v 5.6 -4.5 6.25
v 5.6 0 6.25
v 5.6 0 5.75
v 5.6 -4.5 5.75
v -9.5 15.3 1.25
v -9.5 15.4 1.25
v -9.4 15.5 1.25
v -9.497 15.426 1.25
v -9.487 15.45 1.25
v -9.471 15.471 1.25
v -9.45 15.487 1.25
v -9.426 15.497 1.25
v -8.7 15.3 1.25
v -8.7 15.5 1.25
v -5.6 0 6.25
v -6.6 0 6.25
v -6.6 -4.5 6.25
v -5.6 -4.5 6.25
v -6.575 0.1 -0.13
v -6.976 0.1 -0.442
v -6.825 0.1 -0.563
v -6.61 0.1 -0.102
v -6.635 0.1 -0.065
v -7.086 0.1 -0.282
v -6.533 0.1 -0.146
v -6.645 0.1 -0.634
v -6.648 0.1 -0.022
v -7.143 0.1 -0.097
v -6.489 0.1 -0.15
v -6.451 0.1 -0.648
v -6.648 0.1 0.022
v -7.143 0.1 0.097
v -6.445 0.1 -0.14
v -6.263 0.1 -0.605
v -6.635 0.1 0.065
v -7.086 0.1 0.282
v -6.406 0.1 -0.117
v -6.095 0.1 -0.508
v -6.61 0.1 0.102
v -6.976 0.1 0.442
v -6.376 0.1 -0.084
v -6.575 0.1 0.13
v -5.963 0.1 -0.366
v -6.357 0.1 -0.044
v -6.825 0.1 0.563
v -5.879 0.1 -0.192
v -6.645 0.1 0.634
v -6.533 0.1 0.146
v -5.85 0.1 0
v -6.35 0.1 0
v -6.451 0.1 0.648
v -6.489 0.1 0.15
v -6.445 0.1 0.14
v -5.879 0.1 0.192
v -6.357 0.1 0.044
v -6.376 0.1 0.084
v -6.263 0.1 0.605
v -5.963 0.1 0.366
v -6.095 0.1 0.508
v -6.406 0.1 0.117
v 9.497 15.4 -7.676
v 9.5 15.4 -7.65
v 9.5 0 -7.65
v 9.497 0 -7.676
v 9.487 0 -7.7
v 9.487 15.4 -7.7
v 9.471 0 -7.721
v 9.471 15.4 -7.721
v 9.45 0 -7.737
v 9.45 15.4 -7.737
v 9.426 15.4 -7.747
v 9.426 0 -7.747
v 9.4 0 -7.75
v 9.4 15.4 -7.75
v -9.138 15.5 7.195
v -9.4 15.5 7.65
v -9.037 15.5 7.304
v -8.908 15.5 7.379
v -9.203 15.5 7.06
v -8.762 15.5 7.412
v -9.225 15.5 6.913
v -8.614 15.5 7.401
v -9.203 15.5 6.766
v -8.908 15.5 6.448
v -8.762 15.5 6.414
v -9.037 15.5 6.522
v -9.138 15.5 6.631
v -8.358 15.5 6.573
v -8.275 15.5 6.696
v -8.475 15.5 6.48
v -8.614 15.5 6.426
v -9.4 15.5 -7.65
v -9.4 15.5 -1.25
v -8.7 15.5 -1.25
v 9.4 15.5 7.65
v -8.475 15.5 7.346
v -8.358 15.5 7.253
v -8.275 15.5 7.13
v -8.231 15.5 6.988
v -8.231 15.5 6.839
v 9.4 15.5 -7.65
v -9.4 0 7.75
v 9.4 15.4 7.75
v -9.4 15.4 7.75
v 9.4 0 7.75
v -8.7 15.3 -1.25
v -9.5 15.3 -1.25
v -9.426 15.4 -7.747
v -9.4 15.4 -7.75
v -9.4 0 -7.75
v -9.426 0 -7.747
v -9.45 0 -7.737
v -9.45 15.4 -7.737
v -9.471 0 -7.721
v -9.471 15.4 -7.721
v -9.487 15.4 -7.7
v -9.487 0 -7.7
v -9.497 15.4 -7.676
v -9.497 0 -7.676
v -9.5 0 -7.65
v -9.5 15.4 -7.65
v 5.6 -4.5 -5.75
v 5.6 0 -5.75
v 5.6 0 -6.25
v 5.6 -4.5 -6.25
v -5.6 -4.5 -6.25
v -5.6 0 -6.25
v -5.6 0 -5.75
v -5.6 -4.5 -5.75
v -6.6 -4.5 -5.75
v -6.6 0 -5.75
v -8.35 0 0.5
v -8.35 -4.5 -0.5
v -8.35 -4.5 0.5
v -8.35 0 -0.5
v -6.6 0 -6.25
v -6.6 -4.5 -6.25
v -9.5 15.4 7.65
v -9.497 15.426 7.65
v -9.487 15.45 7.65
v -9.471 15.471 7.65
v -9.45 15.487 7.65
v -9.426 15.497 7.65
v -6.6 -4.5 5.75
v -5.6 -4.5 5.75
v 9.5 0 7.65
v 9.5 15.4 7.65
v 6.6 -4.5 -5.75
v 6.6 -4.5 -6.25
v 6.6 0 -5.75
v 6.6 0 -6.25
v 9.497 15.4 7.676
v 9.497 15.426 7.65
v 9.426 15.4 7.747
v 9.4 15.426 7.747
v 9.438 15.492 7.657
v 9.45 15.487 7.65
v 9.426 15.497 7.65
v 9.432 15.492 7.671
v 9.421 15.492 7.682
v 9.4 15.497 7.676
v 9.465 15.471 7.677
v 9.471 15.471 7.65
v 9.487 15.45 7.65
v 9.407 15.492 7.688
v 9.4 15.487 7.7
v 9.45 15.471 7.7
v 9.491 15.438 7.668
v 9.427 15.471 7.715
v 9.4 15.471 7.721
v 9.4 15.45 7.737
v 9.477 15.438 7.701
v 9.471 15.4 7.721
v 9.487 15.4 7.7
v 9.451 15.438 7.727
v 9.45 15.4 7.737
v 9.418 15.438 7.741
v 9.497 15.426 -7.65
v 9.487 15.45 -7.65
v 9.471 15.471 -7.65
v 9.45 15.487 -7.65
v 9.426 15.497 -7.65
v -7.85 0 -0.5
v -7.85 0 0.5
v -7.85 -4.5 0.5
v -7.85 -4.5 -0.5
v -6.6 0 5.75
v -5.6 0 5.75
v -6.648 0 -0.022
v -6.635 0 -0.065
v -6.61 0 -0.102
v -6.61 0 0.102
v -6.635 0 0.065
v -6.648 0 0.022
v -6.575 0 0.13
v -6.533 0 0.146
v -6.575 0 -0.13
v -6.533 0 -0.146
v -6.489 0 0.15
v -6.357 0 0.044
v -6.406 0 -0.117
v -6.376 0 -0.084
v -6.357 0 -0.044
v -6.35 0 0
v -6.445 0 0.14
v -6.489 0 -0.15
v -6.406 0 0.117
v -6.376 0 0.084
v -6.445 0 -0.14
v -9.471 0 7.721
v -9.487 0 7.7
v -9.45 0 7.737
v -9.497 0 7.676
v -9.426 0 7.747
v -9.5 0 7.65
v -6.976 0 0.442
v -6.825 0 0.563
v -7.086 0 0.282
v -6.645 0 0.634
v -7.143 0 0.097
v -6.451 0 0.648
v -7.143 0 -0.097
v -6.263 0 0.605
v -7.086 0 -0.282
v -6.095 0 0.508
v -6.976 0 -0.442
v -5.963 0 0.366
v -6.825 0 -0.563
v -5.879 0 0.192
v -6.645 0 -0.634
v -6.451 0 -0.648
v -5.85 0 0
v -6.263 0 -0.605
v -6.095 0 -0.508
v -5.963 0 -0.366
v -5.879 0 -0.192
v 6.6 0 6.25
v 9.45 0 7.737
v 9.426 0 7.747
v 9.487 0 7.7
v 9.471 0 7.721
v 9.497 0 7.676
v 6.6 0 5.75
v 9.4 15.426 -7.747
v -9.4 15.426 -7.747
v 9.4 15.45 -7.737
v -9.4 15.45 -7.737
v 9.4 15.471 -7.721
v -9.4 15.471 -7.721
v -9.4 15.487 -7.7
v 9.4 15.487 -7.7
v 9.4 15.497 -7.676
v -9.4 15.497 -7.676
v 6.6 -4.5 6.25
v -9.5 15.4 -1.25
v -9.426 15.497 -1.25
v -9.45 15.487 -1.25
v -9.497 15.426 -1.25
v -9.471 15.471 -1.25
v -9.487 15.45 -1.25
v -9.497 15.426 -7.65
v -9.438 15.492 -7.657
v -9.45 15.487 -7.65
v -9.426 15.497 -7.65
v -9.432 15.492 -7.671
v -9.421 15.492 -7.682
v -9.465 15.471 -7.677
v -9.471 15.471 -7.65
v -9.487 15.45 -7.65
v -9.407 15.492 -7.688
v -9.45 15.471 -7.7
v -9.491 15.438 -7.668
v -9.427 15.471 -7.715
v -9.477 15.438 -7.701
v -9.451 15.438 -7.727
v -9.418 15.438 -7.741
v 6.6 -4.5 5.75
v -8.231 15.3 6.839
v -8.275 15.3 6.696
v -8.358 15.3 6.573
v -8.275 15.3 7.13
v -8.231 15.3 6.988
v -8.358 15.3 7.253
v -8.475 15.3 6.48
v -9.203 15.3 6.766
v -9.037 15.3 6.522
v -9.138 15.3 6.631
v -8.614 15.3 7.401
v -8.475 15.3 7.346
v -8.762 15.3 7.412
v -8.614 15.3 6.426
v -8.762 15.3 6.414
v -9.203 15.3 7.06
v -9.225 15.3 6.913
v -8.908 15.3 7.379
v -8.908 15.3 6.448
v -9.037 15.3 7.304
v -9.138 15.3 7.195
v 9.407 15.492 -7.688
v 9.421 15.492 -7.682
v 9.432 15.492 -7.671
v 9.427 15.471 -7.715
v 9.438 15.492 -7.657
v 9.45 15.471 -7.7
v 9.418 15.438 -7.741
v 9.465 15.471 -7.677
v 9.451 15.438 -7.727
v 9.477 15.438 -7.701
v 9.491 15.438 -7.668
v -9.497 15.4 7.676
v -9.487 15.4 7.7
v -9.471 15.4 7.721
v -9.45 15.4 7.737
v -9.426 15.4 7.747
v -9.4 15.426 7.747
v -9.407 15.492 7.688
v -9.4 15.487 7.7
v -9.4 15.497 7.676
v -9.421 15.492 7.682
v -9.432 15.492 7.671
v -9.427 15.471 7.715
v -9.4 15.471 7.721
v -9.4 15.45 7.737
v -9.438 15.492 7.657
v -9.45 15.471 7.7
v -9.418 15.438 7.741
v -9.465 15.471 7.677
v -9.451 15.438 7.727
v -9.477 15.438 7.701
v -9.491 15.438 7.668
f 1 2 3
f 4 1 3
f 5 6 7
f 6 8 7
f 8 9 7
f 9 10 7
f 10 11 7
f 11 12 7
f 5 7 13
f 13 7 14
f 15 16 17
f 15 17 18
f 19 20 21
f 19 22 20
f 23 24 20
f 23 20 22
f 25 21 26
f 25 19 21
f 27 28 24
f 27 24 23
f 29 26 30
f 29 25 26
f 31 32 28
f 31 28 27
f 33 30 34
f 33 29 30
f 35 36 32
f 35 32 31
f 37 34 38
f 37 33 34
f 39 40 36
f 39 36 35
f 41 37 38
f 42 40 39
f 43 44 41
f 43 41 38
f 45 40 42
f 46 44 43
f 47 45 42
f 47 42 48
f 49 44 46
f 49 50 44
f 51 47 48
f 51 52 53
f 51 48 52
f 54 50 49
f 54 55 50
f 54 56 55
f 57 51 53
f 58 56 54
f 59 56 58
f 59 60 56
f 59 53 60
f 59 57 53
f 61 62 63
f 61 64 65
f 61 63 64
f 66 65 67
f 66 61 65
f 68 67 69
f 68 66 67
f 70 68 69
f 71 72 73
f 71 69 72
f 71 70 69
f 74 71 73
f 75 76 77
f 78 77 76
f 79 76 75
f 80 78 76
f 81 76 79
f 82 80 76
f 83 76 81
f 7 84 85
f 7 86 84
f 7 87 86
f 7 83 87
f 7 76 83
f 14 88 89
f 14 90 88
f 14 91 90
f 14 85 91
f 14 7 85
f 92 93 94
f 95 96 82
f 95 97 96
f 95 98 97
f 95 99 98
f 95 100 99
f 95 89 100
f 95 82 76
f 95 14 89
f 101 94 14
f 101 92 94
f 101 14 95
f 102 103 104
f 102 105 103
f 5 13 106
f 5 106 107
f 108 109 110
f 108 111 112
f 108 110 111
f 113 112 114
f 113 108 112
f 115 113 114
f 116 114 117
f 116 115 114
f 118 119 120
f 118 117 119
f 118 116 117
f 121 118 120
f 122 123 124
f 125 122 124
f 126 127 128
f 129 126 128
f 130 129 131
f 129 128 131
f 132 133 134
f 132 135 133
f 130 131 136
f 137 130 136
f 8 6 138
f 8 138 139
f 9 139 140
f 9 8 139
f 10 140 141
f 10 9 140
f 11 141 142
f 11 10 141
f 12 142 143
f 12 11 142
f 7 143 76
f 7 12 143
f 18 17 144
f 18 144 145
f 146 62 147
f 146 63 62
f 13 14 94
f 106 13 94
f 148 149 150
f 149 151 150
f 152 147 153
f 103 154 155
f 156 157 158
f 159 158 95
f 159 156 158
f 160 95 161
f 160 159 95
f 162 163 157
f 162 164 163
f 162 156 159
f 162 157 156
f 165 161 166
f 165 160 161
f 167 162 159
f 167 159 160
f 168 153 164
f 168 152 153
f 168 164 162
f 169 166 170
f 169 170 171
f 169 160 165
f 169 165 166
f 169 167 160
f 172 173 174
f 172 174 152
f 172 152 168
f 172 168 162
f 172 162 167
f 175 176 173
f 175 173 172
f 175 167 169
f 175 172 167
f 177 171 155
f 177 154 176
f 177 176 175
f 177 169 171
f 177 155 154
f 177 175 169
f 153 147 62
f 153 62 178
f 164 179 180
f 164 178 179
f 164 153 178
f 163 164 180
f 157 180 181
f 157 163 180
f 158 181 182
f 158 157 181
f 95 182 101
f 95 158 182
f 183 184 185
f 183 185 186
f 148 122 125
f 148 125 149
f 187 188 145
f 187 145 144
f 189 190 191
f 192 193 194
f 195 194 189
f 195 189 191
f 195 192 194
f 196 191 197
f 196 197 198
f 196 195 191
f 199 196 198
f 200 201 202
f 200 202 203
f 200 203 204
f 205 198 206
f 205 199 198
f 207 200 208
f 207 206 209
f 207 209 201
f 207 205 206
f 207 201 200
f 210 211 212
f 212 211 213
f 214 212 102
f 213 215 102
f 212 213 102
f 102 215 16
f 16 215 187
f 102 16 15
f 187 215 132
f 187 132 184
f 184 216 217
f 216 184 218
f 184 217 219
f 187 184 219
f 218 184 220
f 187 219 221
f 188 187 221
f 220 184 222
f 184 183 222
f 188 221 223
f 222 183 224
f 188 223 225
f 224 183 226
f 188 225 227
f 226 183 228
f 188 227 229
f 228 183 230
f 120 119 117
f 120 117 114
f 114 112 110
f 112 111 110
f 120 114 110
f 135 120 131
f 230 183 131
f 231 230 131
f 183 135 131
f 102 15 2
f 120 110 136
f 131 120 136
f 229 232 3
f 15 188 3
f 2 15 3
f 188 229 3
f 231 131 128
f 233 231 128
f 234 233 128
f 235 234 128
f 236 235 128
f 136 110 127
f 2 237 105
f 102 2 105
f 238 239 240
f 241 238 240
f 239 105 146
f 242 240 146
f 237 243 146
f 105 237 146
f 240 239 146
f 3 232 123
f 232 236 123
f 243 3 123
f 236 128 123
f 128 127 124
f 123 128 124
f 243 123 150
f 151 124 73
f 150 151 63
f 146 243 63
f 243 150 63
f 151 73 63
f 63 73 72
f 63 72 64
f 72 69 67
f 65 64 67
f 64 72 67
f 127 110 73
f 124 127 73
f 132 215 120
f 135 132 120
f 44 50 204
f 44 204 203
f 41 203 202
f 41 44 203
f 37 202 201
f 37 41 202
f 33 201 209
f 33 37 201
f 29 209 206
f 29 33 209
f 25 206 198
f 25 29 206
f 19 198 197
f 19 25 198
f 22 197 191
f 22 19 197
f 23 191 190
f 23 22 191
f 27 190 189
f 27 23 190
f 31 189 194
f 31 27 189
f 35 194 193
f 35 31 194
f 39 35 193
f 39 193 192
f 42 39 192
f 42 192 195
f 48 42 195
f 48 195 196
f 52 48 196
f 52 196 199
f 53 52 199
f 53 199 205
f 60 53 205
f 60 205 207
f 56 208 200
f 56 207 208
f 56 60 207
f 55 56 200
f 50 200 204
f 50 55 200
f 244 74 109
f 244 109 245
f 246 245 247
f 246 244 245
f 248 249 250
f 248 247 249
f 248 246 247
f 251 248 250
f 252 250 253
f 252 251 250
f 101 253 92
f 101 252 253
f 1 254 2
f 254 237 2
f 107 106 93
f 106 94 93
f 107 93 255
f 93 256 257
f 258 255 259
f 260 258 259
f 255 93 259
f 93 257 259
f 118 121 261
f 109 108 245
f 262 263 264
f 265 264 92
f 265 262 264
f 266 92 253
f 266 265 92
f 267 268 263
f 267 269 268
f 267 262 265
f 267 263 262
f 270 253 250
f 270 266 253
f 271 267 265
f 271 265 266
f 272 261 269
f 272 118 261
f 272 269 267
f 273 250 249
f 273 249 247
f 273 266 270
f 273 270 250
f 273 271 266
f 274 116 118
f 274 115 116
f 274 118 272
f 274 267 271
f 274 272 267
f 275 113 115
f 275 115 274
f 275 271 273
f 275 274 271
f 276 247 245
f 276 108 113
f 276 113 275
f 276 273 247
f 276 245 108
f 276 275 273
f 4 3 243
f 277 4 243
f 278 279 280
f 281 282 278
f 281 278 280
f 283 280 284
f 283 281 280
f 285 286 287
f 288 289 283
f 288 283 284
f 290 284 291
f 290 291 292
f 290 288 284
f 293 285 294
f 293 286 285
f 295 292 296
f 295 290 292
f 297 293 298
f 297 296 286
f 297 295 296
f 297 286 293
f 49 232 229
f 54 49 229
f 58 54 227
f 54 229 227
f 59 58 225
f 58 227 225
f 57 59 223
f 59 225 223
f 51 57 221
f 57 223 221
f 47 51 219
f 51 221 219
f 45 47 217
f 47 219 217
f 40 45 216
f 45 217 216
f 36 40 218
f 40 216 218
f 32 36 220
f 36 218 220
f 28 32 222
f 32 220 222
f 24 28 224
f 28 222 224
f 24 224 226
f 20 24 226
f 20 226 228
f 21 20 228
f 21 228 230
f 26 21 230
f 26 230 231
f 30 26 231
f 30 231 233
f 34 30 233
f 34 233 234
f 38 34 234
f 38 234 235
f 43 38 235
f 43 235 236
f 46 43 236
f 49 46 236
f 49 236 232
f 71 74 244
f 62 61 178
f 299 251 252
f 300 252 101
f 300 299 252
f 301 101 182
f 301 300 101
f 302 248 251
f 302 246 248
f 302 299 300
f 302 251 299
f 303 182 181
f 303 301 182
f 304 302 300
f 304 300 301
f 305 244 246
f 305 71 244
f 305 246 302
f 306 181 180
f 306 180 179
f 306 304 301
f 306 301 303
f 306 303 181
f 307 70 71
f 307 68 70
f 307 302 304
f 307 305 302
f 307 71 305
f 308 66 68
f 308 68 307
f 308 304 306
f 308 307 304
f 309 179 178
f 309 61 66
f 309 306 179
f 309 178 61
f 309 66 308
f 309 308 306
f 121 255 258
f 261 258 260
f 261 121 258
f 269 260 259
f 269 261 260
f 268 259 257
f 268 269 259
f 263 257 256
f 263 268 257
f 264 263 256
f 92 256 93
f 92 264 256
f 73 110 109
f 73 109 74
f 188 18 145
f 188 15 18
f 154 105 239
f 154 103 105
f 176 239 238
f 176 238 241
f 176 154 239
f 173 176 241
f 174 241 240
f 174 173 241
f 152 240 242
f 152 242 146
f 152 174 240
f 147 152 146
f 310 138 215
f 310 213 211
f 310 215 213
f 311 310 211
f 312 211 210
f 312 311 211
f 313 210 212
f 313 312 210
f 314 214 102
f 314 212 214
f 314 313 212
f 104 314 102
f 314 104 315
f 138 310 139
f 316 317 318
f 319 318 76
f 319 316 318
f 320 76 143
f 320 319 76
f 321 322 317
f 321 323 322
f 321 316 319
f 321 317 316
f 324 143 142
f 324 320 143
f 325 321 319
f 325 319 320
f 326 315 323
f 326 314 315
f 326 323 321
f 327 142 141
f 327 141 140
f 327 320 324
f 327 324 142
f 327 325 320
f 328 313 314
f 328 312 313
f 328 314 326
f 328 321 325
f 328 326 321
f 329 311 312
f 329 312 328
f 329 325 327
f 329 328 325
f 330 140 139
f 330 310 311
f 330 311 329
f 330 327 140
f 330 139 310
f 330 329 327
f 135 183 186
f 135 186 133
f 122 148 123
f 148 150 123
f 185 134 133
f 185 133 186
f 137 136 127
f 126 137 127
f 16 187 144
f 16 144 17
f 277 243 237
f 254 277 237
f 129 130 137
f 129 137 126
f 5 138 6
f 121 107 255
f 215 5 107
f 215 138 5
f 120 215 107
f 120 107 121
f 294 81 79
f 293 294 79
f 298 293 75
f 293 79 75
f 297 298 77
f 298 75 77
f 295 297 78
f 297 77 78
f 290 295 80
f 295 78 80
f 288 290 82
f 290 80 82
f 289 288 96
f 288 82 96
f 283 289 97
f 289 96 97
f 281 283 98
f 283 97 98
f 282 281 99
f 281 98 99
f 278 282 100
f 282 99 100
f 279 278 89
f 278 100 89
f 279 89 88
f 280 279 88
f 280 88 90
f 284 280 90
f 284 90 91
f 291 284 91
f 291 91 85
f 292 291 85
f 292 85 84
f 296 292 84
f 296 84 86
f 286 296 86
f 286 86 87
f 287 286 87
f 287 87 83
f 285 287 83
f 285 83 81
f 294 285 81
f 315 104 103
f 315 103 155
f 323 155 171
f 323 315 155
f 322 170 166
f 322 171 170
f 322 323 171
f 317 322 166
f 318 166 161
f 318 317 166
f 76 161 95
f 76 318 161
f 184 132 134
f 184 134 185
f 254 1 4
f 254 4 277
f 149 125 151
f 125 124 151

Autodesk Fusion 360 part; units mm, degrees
sketch "Sketch1" plane through (0, 0, 0) normal (0, 1, 0) x (1, 0, 0)
  line L0 (9.5, -7.75) -> (-9.5, -7.75)
  line L1 (-9.5, -7.75) -> (-9.5, 7.75)
  line L2 (-9.5, 7.75) -> (9.5, 7.75)
  line L3 (9.5, 7.75) -> (9.5, -7.75)
  line L4 (9.5, -7.75) -> (-9.5, 7.75) construction
  line L5 (-9.5, -7.75) -> (9.5, 7.75) construction
  dimension "d1" = 19
  dimension "d2" = 15.5
extrude "Extrude1" add sketch "Sketch1" along normal blind 15.5
fillet "Fillet1" radius 0.1 4 edges at (-9.5, 7.75, -7.75) (9.5, 7.75, -7.75) (9.5, 7.75, 7.75) (-9.5, 7.75, 7.75) 1 faces at (3.1667, 15.5, 2.5833)
sketch "Sketch2" plane through (0, 0, 0) normal (0, -1, 0) x (1, 0, 0)
  arc A0 (9.5, 7.65) -> (9.4, 7.75) centre (9.4, 7.65) ccw
  line L0 (9.4, 7.75) -> (-9.4, 7.75)
  arc A1 (-9.4, 7.75) -> (-9.5, 7.65) centre (-9.4, 7.65) ccw
  line L1 (-9.5, 7.65) -> (-9.5, -7.65)
  arc A2 (-9.5, -7.65) -> (-9.4, -7.75) centre (-9.4, -7.65) ccw
  line L2 (-9.4, -7.75) -> (9.4, -7.75)
  arc A3 (9.4, -7.75) -> (9.5, -7.65) centre (9.4, -7.65) ccw
  line L3 (9.5, -7.65) -> (9.5, 7.65)
  line L4 (6.1, 6) -> (-6.1, 6) construction
  line L5 (-6.1, 6) -> (-6.1, -6) construction
  line L6 (-6.1, -6) -> (6.1, -6) construction
  line L7 (6.1, -6) -> (6.1, 6) construction
  line L8 (6.1, 6) -> (-6.1, -6) construction
  line L9 (-6.1, 6) -> (6.1, -6) construction
  line L10 (-6.1, 0) -> (-8.1, 0) construction
  line L11 (-5.6, 5.75) -> (-6.6, 5.75)
  line L12 (-6.6, 5.75) -> (-6.6, 6.25)
  line L13 (-6.6, 6.25) -> (-5.6, 6.25)
  line L14 (-5.6, 6.25) -> (-5.6, 5.75)
  line L15 (-5.6, 5.75) -> (-6.6, 6.25) construction
  line L16 (-6.6, 5.75) -> (-5.6, 6.25) construction
  line L17 (-5.6, -5.75) -> (-6.6, -5.75)
  line L18 (-6.6, -5.75) -> (-6.6, -6.25)
  line L19 (-6.6, -6.25) -> (-5.6, -6.25)
  line L20 (-5.6, -6.25) -> (-5.6, -5.75)
  line L21 (-5.6, -5.75) -> (-6.6, -6.25) construction
  line L22 (-6.6, -5.75) -> (-5.6, -6.25) construction
  line L23 (6.6, 6.25) -> (5.6, 6.25)
  line L24 (5.6, 6.25) -> (5.6, 5.75)
  line L25 (5.6, 5.75) -> (6.6, 5.75)
  line L26 (6.6, 5.75) -> (6.6, 6.25)
  line L27 (6.6, 6.25) -> (5.6, 5.75) construction
  line L28 (5.6, 6.25) -> (6.6, 5.75) construction
  line L29 (6.6, -5.75) -> (5.6, -5.75)
  line L30 (5.6, -5.75) -> (5.6, -6.25)
  line L31 (5.6, -6.25) -> (6.6, -6.25)
  line L32 (6.6, -6.25) -> (6.6, -5.75)
  line L33 (6.6, -5.75) -> (5.6, -6.25) construction
  line L34 (5.6, -5.75) -> (6.6, -6.25) construction
  line L35 (-7.85, -0.5) -> (-8.35, -0.5)
  line L36 (-8.35, -0.5) -> (-8.35, 0.5)
  line L37 (-8.35, 0.5) -> (-7.85, 0.5)
  line L38 (-7.85, 0.5) -> (-7.85, -0.5)
  line L39 (-7.85, -0.5) -> (-8.35, 0.5) construction
  line L40 (-8.35, -0.5) -> (-7.85, 0.5) construction
  point P0 (-6.1, 6)
  point P1 (-6.1, -6)
  point P2 (6.1, 6)
  point P3 (6.1, -6)
  point P4 (-8.1, 0)
  dimension "d7" = 12.2
  dimension "d8" = 12
  dimension "d9" = 2
  dimension "d10" = 1
  dimension "d11" = 0.5
  dimension "d12" = 1
  dimension "d13" = 0.5
  dimension "d14" = 1
  dimension "d15" = 0.5
  dimension "d16" = 1
  dimension "d17" = 0.5
  dimension "d18" = 0.5
  dimension "d19" = 1
extrude "Extrude2" add sketch "Sketch2" along normal blind 4.5 contours L11 L12 L13 L14 | L17 L18 L19 L20 | L23 L24 L25 L26 | L29 L30 L31 L32 | L35 L36 L37 L38
sketch "Sketch3" plane through (0, 0, 0) normal (0, -1, 0) x (1, 0, 0)
  line L0 (6.6, -6.25) -> (5.6, -6.25)
  line L1 (5.6, -6.25) -> (5.6, -5.75)
  line L2 (5.6, -5.75) -> (6.6, -5.75)
  line L3 (6.6, -5.75) -> (6.6, -6.25)
  line L4 (-5.6, -6.25) -> (-6.6, -6.25)
  line L5 (-6.6, -6.25) -> (-6.6, -5.75)
  line L6 (-6.6, -5.75) -> (-5.6, -5.75)
  line L7 (-5.6, -5.75) -> (-5.6, -6.25)
  line L8 (6.6, 5.75) -> (5.6, 5.75)
  line L9 (5.6, 5.75) -> (5.6, 6.25)
  line L10 (5.6, 6.25) -> (6.6, 6.25)
  line L11 (6.6, 6.25) -> (6.6, 5.75)
  line L12 (-7.85, 0.5) -> (-7.85, -0.5)
  line L13 (-7.85, -0.5) -> (-8.35, -0.5)
  line L14 (-8.35, -0.5) -> (-8.35, 0.5)
  line L15 (-8.35, 0.5) -> (-7.85, 0.5)
  line L16 (-5.6, 6.25) -> (-5.6, 5.75)
  line L17 (-5.6, 5.75) -> (-6.6, 5.75)
  line L18 (-6.6, 5.75) -> (-6.6, 6.25)
  line L19 (-6.6, 6.25) -> (-5.6, 6.25)
  arc A0 (9.5, 7.65) -> (9.4, 7.75) centre (9.4, 7.65) ccw
  line L20 (9.4, 7.75) -> (-9.4, 7.75)
  arc A1 (-9.4, 7.75) -> (-9.5, 7.65) centre (-9.4, 7.65) ccw
  line L21 (-9.5, 7.65) -> (-9.5, -7.65)
  arc A2 (-9.5, -7.65) -> (-9.4, -7.75) centre (-9.4, -7.65) ccw
  line L22 (-9.4, -7.75) -> (9.4, -7.75)
  arc A3 (9.4, -7.75) -> (9.5, -7.65) centre (9.4, -7.65) ccw
  line L23 (9.5, -7.65) -> (9.5, 7.65)
  circle A4 centre (-6.5, 0) radius 0.65
  dimension "d22" = 1.3
extrude "Extrude3" cut sketch "Sketch3" against normal blind 0.1 contours A4
sketch "Sketch4" plane through (0, 0.1, 0) normal (0, -1, 0) x (1, 0, 0)
  circle A0 centre (-6.5, 0) radius 0.65
  circle A1 centre (-6.5, 0) radius 0.15
  dimension "d25" = 0.3
extrude "Extrude4" add sketch "Sketch4" along normal blind 0.1 contours A1
sketch "Sketch5" plane through (0, 15.5, 0) normal (0, 1, 0) x (-1, 0, 0)
  line L0 (9.4, 7.65) -> (-9.4, 7.65)
  line L1 (-9.4, 7.65) -> (-9.4, -7.65)
  line L2 (-9.4, -7.65) -> (9.4, -7.65)
  line L3 (9.4, -7.65) -> (9.4, 7.65)
  line L4 (10.1, 1.25) -> (8.7, 1.25)
  line L5 (8.7, 1.25) -> (8.7, -1.25)
  line L6 (8.7, -1.25) -> (10.1, -1.25)
  line L7 (10.1, -1.25) -> (10.1, 1.25)
  line L8 (10.1, 1.25) -> (8.7, -1.25) construction
  line L9 (8.7, 1.25) -> (10.1, -1.25) construction
  point P0 (9.4, 0)
  dimension "d28" = 1.4
  dimension "d29" = 2.5
extrude "Extrude5" cut sketch "Sketch5" against normal blind 0.2 contours L3 L4 L6 L7 | L3 L4 L5 L6
sketch "Sketch6" plane through (0, 15.5, 0) normal (0, 1, 0) x (-1, 0, 0)
  line L0 (8.7, 1.25) -> (9.4, 1.25)
  line L1 (9.4, 1.25) -> (9.4, 7.65)
  line L2 (9.4, 7.65) -> (-9.4, 7.65)
  line L3 (-9.4, 7.65) -> (-9.4, -7.65)
  line L4 (-9.4, -7.65) -> (9.4, -7.65)
  line L5 (9.4, -7.65) -> (9.4, -1.25)
  line L6 (9.4, -1.25) -> (8.7, -1.25)
  line L7 (8.7, -1.25) -> (8.7, 1.25)
  circle A0 centre (8.725, 6.9131) radius 0.5
  dimension "d32" = 1
extrude "Extrude6" cut sketch "Sketch6" against normal blind 0.2 contours A0
